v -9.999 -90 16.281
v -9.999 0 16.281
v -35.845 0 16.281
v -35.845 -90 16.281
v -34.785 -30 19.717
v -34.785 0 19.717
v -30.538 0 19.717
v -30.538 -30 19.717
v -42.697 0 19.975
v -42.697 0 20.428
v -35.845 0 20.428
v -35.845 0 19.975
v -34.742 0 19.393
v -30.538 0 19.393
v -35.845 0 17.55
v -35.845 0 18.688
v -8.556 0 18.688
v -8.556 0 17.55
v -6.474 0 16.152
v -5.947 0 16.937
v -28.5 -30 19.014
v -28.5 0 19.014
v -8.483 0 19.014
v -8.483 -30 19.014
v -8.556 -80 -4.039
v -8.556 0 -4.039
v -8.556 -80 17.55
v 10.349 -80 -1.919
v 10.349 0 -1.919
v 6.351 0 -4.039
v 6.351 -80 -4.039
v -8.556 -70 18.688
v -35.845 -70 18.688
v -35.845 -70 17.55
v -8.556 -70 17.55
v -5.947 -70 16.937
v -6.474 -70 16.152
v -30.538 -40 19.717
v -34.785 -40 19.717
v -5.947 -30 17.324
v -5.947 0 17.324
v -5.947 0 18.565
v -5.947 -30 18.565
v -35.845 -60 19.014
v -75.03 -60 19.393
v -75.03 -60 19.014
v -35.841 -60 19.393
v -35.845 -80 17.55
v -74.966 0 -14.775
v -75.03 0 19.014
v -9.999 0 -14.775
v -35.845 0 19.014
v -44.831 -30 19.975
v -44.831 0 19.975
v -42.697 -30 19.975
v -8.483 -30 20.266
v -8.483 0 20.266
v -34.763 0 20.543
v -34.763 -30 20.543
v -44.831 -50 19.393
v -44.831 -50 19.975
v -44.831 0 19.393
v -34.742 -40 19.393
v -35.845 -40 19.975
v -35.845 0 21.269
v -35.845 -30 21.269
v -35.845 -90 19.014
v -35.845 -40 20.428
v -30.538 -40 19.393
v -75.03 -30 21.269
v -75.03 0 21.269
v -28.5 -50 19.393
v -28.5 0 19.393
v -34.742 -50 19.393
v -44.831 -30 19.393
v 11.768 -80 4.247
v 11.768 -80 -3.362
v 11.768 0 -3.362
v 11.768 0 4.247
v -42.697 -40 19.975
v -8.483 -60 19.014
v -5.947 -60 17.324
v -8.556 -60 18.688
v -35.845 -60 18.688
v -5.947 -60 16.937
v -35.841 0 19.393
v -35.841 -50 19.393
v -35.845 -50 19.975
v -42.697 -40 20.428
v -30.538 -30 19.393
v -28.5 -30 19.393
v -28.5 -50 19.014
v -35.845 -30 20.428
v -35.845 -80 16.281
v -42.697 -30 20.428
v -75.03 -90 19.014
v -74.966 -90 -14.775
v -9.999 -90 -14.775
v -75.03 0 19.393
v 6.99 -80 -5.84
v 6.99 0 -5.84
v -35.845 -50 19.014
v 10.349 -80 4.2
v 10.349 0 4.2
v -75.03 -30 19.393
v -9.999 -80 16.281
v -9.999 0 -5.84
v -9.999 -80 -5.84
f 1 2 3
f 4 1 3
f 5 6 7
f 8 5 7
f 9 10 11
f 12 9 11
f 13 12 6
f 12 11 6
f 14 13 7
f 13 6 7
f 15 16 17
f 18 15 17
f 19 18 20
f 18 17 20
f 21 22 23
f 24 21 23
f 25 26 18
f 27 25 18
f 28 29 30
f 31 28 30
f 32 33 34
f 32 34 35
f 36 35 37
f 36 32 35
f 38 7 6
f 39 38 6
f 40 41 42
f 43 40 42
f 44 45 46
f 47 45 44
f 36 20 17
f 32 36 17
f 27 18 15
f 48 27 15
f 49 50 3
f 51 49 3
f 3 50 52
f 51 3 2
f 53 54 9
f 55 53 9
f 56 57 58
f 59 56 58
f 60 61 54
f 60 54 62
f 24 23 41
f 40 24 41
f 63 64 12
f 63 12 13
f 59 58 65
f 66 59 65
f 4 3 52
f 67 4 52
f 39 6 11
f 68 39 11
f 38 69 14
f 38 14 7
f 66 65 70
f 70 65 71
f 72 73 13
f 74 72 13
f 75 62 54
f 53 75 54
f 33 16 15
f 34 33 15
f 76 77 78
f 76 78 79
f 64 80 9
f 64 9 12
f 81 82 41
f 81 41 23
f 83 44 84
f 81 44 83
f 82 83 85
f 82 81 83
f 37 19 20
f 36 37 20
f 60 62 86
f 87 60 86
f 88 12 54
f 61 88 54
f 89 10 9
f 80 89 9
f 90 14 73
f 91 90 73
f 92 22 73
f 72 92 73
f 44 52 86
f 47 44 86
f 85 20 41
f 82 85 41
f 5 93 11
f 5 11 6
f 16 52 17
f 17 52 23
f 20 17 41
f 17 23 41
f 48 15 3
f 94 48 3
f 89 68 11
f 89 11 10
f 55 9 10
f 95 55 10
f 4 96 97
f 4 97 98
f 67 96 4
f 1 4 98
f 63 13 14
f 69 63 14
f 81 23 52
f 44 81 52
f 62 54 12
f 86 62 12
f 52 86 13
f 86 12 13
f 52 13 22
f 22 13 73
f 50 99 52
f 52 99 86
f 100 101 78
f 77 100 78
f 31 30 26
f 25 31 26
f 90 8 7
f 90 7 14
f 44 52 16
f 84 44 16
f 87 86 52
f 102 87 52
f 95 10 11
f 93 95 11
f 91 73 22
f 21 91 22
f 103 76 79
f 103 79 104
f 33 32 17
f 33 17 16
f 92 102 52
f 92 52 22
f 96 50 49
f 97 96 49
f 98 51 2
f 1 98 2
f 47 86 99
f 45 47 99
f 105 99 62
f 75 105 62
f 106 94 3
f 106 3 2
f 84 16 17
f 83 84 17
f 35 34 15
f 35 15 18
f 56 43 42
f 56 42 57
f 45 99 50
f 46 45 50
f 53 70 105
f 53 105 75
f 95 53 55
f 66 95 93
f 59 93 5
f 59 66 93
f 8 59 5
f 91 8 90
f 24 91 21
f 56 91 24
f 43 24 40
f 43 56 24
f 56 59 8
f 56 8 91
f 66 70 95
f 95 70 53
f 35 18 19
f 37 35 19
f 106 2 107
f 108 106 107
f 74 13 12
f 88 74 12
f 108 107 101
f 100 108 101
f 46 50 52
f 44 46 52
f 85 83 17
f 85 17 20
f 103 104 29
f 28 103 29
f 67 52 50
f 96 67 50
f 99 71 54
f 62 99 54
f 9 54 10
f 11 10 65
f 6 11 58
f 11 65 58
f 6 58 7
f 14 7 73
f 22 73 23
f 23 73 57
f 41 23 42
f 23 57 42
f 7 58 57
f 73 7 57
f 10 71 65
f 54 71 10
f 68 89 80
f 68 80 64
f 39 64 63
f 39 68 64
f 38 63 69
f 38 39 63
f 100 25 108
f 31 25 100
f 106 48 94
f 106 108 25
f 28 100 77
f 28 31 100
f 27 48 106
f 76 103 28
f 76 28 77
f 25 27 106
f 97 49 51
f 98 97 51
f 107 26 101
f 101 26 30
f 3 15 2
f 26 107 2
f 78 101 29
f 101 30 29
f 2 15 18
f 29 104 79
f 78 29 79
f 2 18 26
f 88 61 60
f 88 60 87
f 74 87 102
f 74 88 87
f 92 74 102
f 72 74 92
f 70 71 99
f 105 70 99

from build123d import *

# Parameters (mm, degrees)
F1_DEPTH = 90
F2_DEPTH = 80
F3_DEPTH = 70
F4_DEPTH = 60
F5_DEPTH = 60
F6_DEPTH = 50
F7_DEPTH = 40
F8_DEPTH = 30


with BuildPart() as f1:
    # F0 (on Front) → F1 (new body)
    with BuildSketch(Plane.XZ):
        Polygon((-35.8449, 19.013606), (-75.02988, 19.013606), (-74.966125, -14.775316), (-9.998596, -14.775316), (-9.998596, -5.839888), (-9.998596, 16.280899), (-35.8449, 16.280899), (-35.8449, 17.549563), (-35.8449, 18.687898), align=None)
    extrude(amount=F1_DEPTH)


with BuildPart() as f2:
    # F0 (on Front) → F2 (new body)
    with BuildSketch(Plane.XZ):
        Polygon((-8.556152, 17.549563), (-35.8449, 17.549563), (-35.8449, 16.280899), (-9.998596, 16.280899), (-9.998596, -5.839888), (6.990168, -5.839888), (11.768258, -3.36236), (11.768258, 4.247191), (10.348914, 4.199779), (10.348914, -1.918942), (6.350542, -4.039291), (-8.556152, -4.039291), align=None)
    extrude(amount=F2_DEPTH)


with BuildPart() as f3:
    # F0 (on Front) → F3 (new body)
    with BuildSketch(Plane.XZ):
        Polygon((-8.556152, 18.687898), (-35.8449, 18.687898), (-35.8449, 17.549563), (-8.556152, 17.549563), (-6.473645, 16.152017), (-5.946931, 16.936881), align=None)
    extrude(amount=F3_DEPTH)


with BuildPart() as f4:
    # F0 (on Front) → F4 (new body)
    with BuildSketch(Plane.XZ):
        Polygon((-75.02988, 19.39325), (-75.02988, 19.013606), (-35.8449, 19.013606), (-35.841163, 19.39325), (-44.831283, 19.39325), align=None)
    extrude(amount=F4_DEPTH)


with BuildPart() as f5:
    # F0 (on Front) → F5 (new body)
    with BuildSketch(Plane.XZ):
        Polygon((-28.500309, 19.013606), (-35.8449, 19.013606), (-35.8449, 18.687898), (-8.556152, 18.687898), (-5.946931, 16.936881), (-5.946931, 17.323582), (-8.48274, 19.013606), align=None)
    extrude(amount=F5_DEPTH)


with BuildPart() as f6:
    # F0 (on Front) → F6 (new body)
    with BuildSketch(Plane.XZ):
        Polygon((-35.841163, 19.39325), (-35.8449, 19.013606), (-28.500309, 19.013606), (-28.500309, 19.39325), (-30.537639, 19.39325), (-34.741651, 19.39325), (-35.8449, 19.975344), (-42.696938, 19.975344), (-44.831283, 19.975344), (-44.831283, 19.39325), align=None)
    extrude(amount=F6_DEPTH)


with BuildPart() as f7:
    # F0 (on Front) → F7 (new body)
    with BuildSketch(Plane.XZ):
        Polygon((-34.741651, 19.39325), (-30.537639, 19.39325), (-30.537639, 19.716972), (-34.78526, 19.716972), (-35.8449, 20.428084), (-42.696938, 20.428084), (-42.696938, 19.975344), (-35.8449, 19.975344), align=None)
    extrude(amount=F7_DEPTH)


with BuildPart() as f8:
    # F0 (on Front) → F8 (new body)
    with BuildSketch(Plane.XZ):
        Polygon((-75.02988, 21.268887), (-75.02988, 19.39325), (-44.831283, 19.39325), (-44.831283, 19.975344), (-42.696938, 19.975344), (-42.696938, 20.428084), (-35.8449, 20.428084), (-34.78526, 19.716972), (-30.537639, 19.716972), (-30.537639, 19.39325), (-28.500309, 19.39325), (-28.500309, 19.013606), (-8.48274, 19.013606), (-5.946931, 17.323582), (-5.946931, 18.56464), (-8.48274, 20.266391), (-34.762665, 20.542613), (-35.8449, 21.268887), align=None)
    extrude(amount=F8_DEPTH)


solid = Compound([f1.part, f2.part, f3.part, f4.part, f5.part, f6.part, f7.part, f8.part])
